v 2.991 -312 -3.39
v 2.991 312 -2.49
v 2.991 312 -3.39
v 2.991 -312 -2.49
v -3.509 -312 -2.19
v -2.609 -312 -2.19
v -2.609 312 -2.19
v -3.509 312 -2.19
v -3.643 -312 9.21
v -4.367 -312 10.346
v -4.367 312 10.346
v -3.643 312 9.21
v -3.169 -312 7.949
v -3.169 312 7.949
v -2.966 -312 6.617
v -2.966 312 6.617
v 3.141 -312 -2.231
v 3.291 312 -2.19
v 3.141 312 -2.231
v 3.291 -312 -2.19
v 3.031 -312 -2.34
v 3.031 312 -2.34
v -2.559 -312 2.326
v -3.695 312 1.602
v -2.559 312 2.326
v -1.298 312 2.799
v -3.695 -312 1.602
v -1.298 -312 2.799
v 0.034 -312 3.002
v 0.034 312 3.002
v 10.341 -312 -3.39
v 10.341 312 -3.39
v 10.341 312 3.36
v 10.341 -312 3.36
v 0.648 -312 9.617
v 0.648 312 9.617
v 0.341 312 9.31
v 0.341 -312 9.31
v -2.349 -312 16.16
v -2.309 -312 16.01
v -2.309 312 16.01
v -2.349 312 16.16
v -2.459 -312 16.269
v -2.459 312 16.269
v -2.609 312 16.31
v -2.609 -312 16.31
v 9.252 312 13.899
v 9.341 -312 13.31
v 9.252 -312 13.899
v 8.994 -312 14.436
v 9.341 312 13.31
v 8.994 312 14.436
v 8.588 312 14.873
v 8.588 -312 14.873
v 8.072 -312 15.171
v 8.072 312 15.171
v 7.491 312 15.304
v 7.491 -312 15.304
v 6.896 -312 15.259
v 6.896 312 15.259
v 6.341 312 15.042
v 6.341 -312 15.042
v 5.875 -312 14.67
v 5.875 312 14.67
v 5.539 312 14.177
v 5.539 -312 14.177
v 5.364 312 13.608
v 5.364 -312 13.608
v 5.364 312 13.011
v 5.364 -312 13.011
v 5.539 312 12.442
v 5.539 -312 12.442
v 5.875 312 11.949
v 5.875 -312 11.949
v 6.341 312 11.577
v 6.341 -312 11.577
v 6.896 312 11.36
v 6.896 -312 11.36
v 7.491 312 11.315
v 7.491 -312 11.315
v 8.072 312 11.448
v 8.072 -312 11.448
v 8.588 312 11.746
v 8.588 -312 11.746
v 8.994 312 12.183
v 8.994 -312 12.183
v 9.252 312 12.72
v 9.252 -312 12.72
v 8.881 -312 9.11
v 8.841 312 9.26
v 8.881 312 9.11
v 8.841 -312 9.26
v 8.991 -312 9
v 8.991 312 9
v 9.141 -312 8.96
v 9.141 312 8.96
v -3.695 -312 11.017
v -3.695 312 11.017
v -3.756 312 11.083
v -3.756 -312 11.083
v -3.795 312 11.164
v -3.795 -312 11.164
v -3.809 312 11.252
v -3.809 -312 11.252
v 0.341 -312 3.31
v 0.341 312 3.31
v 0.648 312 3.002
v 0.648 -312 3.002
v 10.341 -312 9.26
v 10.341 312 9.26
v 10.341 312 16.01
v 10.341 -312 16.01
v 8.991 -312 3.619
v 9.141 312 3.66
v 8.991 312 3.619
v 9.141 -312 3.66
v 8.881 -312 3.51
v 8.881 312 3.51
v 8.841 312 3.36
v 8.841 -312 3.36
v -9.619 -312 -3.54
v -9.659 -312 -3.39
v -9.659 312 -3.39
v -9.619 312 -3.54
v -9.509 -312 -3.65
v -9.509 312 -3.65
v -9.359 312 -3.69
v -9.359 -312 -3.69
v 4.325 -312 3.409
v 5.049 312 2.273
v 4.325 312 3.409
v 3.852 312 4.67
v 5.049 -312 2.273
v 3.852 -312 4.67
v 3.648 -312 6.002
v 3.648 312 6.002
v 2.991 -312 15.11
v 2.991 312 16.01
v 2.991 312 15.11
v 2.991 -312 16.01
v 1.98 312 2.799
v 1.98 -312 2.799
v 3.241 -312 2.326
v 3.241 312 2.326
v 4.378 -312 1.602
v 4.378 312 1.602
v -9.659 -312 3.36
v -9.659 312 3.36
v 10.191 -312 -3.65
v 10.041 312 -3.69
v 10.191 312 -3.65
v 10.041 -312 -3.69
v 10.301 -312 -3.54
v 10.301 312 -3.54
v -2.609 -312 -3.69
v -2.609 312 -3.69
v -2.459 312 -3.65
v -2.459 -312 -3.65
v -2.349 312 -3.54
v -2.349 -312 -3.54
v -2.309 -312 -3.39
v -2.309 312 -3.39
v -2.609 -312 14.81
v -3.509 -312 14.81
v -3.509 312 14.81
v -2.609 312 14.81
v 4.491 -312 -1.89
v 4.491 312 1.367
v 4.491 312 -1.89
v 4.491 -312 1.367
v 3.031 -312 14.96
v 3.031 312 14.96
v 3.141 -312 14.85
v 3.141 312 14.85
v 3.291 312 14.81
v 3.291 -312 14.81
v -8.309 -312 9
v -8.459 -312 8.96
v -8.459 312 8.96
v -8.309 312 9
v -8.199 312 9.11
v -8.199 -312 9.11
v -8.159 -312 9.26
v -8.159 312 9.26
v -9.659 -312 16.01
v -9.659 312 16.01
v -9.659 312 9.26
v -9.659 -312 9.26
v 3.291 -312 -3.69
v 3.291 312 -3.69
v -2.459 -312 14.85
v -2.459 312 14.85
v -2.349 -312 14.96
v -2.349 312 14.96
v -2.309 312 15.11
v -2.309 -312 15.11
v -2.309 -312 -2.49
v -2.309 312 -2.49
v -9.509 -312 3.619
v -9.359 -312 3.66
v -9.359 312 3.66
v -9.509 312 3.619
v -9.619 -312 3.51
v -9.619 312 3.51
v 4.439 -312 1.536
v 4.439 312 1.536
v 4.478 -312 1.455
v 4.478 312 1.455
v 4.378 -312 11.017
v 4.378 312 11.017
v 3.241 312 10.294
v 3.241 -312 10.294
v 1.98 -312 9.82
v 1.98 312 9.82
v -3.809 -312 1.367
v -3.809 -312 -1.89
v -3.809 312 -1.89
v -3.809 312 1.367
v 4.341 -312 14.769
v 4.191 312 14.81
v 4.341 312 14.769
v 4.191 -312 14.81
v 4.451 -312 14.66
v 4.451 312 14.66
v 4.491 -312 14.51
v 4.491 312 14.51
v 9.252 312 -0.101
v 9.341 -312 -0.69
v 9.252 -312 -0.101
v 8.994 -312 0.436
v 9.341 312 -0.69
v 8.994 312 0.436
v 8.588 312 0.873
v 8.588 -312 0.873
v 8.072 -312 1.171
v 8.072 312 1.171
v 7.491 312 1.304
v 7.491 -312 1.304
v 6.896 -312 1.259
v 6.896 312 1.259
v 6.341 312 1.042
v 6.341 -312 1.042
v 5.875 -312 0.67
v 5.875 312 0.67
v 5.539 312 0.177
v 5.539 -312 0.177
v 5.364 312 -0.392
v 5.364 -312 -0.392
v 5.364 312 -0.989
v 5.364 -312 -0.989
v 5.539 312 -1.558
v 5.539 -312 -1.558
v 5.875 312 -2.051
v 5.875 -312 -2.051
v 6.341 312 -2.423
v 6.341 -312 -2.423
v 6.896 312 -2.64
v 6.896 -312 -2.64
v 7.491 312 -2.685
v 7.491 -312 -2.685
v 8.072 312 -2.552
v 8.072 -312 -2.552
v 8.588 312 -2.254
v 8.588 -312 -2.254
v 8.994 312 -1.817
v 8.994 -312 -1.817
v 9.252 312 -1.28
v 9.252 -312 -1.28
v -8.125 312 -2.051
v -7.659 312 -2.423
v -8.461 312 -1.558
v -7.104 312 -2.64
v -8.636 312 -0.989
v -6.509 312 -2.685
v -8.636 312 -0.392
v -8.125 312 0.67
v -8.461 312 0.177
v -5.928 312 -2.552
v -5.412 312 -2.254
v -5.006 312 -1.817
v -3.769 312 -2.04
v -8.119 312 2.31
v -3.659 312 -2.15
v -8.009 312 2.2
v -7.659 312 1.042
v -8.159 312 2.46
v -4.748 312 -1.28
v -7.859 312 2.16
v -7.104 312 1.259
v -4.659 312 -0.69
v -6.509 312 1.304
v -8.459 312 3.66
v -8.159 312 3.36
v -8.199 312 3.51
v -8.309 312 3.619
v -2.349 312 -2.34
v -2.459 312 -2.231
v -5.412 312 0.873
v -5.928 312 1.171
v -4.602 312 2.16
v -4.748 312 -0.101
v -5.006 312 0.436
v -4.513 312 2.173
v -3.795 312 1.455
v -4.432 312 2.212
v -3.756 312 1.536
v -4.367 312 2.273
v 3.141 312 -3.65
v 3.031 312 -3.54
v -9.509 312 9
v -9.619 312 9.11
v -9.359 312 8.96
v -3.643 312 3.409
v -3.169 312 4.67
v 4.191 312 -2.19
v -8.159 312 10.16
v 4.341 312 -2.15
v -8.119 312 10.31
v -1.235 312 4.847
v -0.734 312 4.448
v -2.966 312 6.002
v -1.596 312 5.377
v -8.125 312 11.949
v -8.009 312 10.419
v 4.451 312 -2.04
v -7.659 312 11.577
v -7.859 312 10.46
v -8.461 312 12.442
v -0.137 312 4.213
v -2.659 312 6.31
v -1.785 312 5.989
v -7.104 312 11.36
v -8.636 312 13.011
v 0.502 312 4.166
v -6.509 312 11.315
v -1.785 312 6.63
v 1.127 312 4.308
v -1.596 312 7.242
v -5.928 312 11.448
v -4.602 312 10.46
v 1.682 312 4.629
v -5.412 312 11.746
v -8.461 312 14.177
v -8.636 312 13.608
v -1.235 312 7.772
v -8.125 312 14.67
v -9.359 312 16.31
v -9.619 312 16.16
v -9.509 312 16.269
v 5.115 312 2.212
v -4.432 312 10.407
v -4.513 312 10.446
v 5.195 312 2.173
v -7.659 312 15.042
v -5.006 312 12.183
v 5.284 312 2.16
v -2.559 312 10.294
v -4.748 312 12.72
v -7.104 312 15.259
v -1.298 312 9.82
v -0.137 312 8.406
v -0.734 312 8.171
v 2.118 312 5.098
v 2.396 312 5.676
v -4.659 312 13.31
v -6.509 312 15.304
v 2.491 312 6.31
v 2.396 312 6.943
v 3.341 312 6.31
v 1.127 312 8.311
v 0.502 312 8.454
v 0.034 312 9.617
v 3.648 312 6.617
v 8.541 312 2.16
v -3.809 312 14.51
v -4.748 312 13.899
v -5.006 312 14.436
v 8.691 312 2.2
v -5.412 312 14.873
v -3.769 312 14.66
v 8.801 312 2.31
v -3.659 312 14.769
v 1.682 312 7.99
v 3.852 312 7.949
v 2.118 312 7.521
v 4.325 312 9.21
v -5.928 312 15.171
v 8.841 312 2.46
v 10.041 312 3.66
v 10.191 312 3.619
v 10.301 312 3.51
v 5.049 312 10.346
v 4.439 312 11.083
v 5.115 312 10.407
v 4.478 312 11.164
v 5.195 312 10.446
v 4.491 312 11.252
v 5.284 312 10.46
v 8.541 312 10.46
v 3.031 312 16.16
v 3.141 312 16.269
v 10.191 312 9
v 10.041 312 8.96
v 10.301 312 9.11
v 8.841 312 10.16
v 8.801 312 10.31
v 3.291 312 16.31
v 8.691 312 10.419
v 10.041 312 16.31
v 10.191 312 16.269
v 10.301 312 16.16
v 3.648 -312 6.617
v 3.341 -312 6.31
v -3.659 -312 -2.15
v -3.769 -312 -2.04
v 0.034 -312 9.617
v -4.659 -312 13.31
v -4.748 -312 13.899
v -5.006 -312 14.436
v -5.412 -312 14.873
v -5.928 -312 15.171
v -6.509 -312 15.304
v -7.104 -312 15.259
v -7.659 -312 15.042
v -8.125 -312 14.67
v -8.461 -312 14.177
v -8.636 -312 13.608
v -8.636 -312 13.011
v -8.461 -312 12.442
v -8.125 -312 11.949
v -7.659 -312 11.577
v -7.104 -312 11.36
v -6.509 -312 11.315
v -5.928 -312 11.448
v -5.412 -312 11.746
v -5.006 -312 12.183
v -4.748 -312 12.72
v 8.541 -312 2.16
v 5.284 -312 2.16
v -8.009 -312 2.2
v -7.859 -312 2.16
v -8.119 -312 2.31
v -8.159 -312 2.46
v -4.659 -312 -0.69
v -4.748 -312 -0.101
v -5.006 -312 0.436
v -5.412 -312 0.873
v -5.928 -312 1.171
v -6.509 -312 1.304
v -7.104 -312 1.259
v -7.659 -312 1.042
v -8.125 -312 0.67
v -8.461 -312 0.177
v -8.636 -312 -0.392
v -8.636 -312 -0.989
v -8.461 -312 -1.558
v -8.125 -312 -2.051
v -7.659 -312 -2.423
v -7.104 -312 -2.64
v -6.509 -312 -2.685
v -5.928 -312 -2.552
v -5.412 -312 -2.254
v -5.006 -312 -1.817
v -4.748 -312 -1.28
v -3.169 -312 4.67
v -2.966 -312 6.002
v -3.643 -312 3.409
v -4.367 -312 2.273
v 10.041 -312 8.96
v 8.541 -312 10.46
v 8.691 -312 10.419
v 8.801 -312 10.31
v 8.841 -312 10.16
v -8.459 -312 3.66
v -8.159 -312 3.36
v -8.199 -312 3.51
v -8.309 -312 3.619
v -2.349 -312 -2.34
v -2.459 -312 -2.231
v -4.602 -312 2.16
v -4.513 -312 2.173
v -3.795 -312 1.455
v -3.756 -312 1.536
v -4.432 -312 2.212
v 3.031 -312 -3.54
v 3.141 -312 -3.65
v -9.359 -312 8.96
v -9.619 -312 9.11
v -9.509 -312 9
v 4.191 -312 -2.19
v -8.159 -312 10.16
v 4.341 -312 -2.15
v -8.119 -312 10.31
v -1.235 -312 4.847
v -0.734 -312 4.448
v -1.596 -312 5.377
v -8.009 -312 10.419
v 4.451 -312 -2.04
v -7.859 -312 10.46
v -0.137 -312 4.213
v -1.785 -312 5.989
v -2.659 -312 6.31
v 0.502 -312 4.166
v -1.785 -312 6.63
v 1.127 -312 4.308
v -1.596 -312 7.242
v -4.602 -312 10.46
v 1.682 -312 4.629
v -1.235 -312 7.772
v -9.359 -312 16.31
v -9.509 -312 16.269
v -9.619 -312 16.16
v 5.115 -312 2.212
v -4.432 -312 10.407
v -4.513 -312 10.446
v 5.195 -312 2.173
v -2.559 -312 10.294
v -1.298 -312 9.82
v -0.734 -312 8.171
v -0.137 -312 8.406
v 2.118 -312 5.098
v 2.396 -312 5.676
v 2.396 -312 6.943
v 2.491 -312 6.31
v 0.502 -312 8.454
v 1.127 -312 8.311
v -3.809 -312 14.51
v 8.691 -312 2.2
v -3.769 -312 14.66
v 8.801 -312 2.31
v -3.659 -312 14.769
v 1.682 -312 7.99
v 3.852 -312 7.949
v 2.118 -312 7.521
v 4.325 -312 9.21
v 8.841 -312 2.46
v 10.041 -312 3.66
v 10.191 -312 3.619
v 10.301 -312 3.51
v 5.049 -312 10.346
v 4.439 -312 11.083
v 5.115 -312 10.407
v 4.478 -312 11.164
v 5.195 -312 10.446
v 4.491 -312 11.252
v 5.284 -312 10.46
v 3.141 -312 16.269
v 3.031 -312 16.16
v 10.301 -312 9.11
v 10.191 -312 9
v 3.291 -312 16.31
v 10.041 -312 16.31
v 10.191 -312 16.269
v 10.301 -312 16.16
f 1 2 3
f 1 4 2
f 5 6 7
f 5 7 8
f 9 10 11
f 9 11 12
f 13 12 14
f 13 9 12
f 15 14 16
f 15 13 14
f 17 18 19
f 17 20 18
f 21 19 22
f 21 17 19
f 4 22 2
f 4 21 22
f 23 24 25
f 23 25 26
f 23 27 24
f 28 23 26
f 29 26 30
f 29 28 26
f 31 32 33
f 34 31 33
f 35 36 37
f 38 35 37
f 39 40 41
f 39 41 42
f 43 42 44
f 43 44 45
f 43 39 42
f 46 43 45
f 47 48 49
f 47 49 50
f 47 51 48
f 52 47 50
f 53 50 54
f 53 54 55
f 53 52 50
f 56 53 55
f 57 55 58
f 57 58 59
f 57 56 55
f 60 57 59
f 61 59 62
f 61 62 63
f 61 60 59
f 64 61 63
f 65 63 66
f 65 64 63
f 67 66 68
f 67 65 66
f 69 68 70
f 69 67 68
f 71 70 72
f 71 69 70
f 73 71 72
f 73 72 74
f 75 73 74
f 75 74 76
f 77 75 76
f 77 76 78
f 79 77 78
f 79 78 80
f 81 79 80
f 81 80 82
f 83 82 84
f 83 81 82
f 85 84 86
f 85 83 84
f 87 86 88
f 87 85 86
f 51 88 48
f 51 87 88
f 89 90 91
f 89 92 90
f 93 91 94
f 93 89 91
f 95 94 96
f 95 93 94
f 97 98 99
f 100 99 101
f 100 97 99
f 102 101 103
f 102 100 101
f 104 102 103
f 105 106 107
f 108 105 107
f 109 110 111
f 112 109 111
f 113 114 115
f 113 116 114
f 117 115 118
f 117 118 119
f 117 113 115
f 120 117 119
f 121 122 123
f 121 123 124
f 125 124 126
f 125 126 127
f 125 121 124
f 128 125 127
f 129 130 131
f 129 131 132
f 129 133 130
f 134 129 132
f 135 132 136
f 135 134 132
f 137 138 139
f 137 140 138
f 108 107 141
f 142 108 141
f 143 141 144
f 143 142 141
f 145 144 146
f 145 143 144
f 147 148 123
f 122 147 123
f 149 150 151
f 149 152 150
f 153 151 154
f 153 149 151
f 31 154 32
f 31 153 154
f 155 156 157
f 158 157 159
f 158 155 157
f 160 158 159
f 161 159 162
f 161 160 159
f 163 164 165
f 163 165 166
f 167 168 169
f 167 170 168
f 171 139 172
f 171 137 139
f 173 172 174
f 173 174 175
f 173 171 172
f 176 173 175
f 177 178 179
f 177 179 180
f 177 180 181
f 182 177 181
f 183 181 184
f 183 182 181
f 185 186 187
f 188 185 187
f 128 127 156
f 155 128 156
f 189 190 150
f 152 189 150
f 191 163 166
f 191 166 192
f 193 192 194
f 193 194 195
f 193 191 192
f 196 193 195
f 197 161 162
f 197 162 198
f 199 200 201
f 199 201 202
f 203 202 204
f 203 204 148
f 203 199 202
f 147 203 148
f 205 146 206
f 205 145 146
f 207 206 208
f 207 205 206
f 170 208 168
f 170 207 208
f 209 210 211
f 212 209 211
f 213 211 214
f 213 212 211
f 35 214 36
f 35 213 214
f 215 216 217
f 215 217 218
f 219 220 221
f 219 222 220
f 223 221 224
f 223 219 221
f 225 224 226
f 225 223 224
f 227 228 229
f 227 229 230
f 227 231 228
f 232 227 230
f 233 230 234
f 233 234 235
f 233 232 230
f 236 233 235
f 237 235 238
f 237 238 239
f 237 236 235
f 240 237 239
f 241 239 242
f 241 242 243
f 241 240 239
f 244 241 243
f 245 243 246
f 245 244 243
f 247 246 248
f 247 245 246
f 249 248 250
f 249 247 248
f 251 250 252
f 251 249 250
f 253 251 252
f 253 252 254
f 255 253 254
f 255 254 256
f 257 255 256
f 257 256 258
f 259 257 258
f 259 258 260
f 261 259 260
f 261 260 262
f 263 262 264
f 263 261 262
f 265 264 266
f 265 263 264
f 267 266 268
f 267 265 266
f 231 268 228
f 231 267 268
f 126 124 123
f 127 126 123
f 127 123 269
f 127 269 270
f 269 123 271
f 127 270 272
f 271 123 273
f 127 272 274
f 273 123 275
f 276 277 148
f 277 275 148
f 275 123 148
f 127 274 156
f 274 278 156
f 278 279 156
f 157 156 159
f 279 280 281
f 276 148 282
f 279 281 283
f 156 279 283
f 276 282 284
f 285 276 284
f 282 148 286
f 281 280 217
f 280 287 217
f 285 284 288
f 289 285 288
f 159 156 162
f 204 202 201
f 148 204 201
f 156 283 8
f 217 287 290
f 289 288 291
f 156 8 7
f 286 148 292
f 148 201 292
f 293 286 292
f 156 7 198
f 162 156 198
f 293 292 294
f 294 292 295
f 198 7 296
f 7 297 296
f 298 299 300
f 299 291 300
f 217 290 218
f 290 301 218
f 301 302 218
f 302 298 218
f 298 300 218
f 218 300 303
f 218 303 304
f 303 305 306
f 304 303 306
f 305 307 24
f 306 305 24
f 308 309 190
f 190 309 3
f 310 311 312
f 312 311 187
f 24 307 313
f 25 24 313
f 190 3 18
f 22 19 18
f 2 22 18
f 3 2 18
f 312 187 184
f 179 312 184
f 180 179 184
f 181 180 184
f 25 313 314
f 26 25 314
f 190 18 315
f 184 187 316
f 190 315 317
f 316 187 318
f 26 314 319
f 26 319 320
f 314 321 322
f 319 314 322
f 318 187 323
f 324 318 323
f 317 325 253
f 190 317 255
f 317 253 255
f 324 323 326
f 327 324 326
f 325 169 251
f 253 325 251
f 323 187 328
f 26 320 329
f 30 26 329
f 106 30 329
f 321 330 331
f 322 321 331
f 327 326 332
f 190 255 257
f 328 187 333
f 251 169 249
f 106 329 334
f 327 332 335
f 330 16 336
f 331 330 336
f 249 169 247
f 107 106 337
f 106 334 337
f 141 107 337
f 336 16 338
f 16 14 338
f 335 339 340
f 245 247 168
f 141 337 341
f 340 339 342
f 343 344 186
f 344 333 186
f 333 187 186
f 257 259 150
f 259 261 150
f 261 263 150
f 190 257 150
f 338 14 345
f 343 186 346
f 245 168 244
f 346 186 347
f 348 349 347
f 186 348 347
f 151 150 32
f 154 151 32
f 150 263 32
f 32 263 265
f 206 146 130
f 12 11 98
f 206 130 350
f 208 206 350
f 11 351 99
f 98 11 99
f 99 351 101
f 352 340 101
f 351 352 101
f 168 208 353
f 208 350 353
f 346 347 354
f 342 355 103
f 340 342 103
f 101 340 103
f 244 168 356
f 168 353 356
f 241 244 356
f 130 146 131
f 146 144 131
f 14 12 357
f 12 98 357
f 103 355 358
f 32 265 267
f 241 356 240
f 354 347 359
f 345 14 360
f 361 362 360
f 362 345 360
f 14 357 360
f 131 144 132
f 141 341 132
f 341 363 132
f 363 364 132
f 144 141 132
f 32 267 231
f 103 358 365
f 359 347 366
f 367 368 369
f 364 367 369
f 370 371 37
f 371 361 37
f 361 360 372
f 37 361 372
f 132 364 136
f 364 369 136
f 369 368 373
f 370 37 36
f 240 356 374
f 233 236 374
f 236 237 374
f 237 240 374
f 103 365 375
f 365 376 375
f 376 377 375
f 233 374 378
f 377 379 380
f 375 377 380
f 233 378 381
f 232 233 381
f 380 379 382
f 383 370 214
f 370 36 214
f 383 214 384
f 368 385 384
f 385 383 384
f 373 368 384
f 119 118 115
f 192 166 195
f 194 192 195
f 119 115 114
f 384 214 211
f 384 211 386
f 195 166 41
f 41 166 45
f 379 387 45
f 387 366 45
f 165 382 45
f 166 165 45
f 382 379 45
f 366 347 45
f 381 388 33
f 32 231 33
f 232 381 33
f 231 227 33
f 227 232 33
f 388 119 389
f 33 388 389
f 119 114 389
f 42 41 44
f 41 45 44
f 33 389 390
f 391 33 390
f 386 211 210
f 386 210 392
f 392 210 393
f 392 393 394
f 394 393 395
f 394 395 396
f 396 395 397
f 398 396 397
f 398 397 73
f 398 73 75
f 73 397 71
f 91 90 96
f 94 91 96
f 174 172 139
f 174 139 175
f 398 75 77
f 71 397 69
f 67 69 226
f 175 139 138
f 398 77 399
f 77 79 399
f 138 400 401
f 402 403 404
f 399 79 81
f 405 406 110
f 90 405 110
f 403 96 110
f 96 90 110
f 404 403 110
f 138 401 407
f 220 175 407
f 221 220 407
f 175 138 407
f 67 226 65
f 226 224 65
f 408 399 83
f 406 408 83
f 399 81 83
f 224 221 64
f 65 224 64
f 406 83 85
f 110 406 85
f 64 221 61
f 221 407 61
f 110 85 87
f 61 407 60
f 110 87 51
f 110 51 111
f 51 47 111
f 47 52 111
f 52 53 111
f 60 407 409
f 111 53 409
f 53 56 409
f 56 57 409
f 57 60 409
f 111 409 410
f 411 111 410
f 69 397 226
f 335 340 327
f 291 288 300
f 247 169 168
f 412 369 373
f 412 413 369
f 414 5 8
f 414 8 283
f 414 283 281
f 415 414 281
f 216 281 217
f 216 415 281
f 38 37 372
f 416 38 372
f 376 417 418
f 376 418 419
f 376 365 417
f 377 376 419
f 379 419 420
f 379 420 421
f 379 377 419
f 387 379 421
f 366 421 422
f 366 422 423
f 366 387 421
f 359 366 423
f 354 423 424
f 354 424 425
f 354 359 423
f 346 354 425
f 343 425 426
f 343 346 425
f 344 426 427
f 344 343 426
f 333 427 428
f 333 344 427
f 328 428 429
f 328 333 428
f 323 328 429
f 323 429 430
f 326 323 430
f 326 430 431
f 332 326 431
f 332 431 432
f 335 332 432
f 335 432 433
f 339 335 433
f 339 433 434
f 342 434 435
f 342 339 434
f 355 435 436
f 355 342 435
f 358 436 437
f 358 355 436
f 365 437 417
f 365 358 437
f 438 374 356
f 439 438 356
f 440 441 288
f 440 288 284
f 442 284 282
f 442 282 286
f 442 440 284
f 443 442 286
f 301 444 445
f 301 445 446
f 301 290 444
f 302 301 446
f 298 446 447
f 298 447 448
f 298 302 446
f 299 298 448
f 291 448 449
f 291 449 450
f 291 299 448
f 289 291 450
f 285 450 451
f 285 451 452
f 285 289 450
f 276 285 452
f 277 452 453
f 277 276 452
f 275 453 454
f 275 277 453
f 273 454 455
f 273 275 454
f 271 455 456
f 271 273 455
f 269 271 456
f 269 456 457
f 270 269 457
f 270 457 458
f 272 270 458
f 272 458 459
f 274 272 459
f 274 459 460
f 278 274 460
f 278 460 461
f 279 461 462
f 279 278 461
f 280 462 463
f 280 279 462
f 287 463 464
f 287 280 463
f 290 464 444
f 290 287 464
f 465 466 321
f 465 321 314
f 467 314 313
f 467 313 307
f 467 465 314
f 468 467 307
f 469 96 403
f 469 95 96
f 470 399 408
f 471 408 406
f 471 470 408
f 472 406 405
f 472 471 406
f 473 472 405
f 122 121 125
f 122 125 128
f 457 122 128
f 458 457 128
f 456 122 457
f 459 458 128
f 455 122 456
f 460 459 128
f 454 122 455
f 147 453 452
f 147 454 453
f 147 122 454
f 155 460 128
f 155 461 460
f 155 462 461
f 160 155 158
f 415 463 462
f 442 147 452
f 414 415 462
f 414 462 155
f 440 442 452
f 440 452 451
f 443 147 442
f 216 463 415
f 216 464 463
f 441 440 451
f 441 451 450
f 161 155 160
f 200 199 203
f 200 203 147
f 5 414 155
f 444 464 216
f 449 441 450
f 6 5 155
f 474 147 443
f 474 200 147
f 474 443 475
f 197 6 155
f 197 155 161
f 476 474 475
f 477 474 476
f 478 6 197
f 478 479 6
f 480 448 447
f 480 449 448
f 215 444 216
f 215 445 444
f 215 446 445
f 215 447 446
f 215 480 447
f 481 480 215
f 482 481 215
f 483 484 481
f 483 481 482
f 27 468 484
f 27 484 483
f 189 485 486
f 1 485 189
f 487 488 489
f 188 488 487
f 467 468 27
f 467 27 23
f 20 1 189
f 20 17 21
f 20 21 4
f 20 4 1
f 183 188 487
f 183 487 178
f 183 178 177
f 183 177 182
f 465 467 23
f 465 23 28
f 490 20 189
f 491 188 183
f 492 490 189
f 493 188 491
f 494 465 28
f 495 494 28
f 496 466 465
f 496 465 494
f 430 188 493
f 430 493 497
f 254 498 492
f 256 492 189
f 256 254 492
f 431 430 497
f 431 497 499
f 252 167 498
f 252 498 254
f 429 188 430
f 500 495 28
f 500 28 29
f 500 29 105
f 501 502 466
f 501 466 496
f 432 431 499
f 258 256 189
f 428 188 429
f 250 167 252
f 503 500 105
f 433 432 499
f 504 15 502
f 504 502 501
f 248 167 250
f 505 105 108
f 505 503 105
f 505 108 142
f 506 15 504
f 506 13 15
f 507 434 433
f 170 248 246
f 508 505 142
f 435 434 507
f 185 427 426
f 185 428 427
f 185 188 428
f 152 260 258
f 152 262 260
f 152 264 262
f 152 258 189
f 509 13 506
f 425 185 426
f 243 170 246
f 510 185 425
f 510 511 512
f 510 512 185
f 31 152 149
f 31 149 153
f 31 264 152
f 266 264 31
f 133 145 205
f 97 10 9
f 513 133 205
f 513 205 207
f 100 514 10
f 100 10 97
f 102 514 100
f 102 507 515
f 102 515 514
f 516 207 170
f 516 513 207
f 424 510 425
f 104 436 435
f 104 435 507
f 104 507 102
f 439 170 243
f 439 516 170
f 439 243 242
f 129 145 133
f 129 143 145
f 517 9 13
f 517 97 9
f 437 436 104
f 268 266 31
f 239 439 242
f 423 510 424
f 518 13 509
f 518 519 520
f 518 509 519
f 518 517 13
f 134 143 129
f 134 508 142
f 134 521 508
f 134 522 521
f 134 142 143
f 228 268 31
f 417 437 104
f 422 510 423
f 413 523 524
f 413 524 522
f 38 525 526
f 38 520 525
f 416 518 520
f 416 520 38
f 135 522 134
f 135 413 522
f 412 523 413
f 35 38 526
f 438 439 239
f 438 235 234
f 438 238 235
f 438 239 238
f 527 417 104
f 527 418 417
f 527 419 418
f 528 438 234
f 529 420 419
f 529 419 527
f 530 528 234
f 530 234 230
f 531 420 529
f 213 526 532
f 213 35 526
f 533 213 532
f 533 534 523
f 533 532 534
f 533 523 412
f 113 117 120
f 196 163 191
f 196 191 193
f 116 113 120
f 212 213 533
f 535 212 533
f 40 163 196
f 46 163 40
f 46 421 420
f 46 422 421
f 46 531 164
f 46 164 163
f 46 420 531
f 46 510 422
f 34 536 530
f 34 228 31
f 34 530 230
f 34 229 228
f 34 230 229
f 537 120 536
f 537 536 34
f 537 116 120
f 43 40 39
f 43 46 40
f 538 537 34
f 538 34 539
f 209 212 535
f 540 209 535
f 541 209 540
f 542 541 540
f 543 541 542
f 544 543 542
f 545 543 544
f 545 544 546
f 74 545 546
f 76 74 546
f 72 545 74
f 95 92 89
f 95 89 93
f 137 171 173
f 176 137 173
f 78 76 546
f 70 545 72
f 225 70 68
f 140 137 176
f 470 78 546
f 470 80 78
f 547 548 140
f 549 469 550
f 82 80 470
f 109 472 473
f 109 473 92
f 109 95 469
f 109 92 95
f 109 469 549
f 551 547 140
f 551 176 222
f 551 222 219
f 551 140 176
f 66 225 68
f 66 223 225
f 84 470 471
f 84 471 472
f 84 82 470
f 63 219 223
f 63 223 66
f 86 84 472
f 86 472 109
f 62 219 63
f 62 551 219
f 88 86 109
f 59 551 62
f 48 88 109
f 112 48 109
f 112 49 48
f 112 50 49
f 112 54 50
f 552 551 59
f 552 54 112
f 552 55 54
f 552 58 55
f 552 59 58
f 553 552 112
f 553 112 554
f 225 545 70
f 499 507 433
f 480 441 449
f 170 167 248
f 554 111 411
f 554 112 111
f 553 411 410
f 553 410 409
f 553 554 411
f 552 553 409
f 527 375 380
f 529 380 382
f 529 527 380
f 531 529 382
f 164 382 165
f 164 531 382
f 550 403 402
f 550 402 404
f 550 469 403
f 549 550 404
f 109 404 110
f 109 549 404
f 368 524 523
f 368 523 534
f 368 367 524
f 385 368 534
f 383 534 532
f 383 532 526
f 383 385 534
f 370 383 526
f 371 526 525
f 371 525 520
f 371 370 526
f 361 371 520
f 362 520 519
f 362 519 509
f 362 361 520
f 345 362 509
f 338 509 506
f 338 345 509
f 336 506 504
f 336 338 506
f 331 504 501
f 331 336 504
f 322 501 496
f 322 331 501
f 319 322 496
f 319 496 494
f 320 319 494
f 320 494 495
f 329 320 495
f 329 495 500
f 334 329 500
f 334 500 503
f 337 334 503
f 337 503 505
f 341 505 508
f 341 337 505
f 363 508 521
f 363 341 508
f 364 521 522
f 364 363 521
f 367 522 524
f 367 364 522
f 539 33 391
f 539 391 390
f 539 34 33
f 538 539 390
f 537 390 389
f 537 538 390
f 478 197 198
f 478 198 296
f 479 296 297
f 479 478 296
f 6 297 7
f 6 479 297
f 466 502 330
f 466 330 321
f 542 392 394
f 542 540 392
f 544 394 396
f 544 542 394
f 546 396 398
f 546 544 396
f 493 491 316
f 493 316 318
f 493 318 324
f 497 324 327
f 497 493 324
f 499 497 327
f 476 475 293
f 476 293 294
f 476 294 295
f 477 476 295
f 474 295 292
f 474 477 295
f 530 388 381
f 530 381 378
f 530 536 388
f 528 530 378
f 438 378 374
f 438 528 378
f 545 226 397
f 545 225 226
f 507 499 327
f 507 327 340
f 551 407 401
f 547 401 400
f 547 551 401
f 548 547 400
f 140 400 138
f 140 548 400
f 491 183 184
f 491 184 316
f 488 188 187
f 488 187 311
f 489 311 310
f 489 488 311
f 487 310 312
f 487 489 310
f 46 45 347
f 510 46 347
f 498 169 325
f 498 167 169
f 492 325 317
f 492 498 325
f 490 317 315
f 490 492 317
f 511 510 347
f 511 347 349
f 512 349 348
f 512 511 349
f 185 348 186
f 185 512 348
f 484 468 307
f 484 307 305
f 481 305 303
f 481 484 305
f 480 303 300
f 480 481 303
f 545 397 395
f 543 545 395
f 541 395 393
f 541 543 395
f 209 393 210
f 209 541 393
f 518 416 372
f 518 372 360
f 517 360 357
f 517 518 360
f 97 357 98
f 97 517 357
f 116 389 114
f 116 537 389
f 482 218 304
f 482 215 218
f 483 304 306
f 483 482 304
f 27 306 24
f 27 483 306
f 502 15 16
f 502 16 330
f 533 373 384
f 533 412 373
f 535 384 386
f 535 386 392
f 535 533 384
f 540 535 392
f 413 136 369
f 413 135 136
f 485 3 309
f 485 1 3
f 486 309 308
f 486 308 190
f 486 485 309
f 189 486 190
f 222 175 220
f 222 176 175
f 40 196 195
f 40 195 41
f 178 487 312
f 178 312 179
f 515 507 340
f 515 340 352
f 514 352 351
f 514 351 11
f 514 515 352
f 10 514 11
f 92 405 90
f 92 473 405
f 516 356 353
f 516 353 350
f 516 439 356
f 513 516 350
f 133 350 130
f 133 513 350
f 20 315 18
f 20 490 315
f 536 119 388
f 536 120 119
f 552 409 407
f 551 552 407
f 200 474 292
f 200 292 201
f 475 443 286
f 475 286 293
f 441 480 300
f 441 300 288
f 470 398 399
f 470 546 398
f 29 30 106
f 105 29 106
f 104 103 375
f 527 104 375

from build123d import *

# Parameters (mm, degrees)
F0_R     = 2
F0_R_2   = 2.15
F1_DEPTH = 312


# Not quite as in the source:
# - ends of sketch curves that miss each other by under 0.0002 mm in the source are joined


with BuildPart() as f1:
    # F0 (on Front) → F1 (new body, symmetric)
    with BuildSketch(Plane.XZ):
        with BuildLine():
            Line((4.49119, 14.509531), (4.49119, 11.252281))
            ThreePointArc((4.49119, 11.252281), (4.4613472004, 11.1218391084), (4.377756086, 11.0173488916))
            ThreePointArc((4.377756086, 11.0173488916), (2.6232116259, 10.0239112371), (0.6484679813, 9.6168093955))
            Line((0.6484679813, 9.6168093955), (0.34119, 9.309531))
            Line((0.34119, 9.309531), (0.033913, 9.616809))
            ThreePointArc((0.033913, 9.616809), (-1.9408311583, 10.0239110615), (-3.695375823, 11.0173492229))
            ThreePointArc((-3.695375823, 11.0173492229), (-3.7789672004, 11.1218391084), (-3.80881, 11.252281))
            Line((-3.80881, 11.252281), (-3.80881, 14.509531))
            ThreePointArc((-3.80881, 14.509531), (-3.7209420344, 14.7216630344), (-3.50881, 14.809531))
            Line((-3.50881, 14.809531), (-2.60881, 14.809531))
            ThreePointArc((-2.60881, 14.809531), (-2.3966779656, 14.8973989656), (-2.30881, 15.109531))
            Line((-2.30881, 15.109531), (-2.30881, 16.009531))
            ThreePointArc((-2.30881, 16.009531), (-2.3966779656, 16.2216630344), (-2.60881, 16.309531))
            Line((-2.60881, 16.309531), (-9.35881, 16.309531))
            ThreePointArc((-9.35881, 16.309531), (-9.5709420344, 16.2216630344), (-9.65881, 16.009531))
            Line((-9.65881, 16.009531), (-9.65881, 9.259531))
            ThreePointArc((-9.65881, 9.259531), (-9.5709420344, 9.0473989656), (-9.35881, 8.959531))
            Line((-9.35881, 8.959531), (-8.45881, 8.959531))
            ThreePointArc((-8.45881, 8.959531), (-8.2466779656, 9.0473989656), (-8.15881, 9.259531))
            Line((-8.15881, 9.259531), (-8.15881, 10.159531))
            ThreePointArc((-8.15881, 10.159531), (-8.0709420344, 10.3716630344), (-7.85881, 10.459531))
            Line((-7.85881, 10.459531), (-4.601559, 10.459531))
            ThreePointArc((-4.601559, 10.459531), (-4.471117461, 10.4296883706), (-4.3666273786, 10.3460976993))
            ThreePointArc((-4.3666273786, 10.3460976993), (-3.3731893747, 8.5915529924), (-2.9660873955, 6.6168089813))
            Line((-2.9660873955, 6.6168089813), (-2.65881, 6.309531))
            Line((-2.65881, 6.309531), (-2.966087, 6.002254))
            ThreePointArc((-2.966087, 6.002254), (-3.3731890615, 4.0275098417), (-4.3666272229, 2.272965177))
            ThreePointArc((-4.3666272229, 2.272965177), (-4.4711171084, 2.1893737996), (-4.601559, 2.159531))
            Line((-4.601559, 2.159531), (-7.85881, 2.159531))
            ThreePointArc((-7.85881, 2.159531), (-8.0709420344, 2.2473989656), (-8.15881, 2.459531))
            Line((-8.15881, 2.459531), (-8.15881, 3.359531))
            ThreePointArc((-8.15881, 3.359531), (-8.2466779656, 3.5716630344), (-8.45881, 3.659531))
            Line((-8.45881, 3.659531), (-9.35881, 3.659531))
            ThreePointArc((-9.35881, 3.659531), (-9.5709420344, 3.5716630344), (-9.65881, 3.359531))
            Line((-9.65881, 3.359531), (-9.65881, -3.390469))
            ThreePointArc((-9.65881, -3.390469), (-9.5709420344, -3.6026010344), (-9.35881, -3.690469))
            Line((-9.35881, -3.690469), (-2.60881, -3.690469))
            ThreePointArc((-2.60881, -3.690469), (-2.3966779656, -3.6026010344), (-2.30881, -3.390469))
            Line((-2.30881, -3.390469), (-2.30881, -2.490469))
            ThreePointArc((-2.30881, -2.490469), (-2.3966779656, -2.2783369656), (-2.60881, -2.190469))
            Line((-2.60881, -2.190469), (-3.50881, -2.190469))
            ThreePointArc((-3.50881, -2.190469), (-3.7209420344, -2.1026010344), (-3.80881, -1.890469))
            Line((-3.80881, -1.890469), (-3.80881, 1.366782))
            ThreePointArc((-3.80881, 1.366782), (-3.7789672004, 1.4972238916), (-3.695376086, 1.6017141084))
            ThreePointArc((-3.695376086, 1.6017141084), (-1.9408311583, 2.5951519385), (0.0339130165, 3.0022536517))
            Line((0.0339130165, 3.0022536517), (0.34119, 3.309531))
            Line((0.34119, 3.309531), (0.648468, 3.002254))
            ThreePointArc((0.648468, 3.002254), (2.6232116259, 2.5951517629), (4.377755823, 1.6017137771))
            ThreePointArc((4.377755823, 1.6017137771), (4.4613472004, 1.4972238916), (4.49119, 1.366782))
            Line((4.49119, 1.366782), (4.49119, -1.890469))
            ThreePointArc((4.49119, -1.890469), (4.4033220344, -2.1026010344), (4.19119, -2.190469))
            Line((4.19119, -2.190469), (3.29119, -2.190469))
            ThreePointArc((3.29119, -2.190469), (3.0790579656, -2.2783369656), (2.99119, -2.490469))
            Line((2.99119, -2.490469), (2.99119, -3.390469))
            ThreePointArc((2.99119, -3.390469), (3.0790579656, -3.6026010344), (3.29119, -3.690469))
            Line((3.29119, -3.690469), (10.04119, -3.690469))
            ThreePointArc((10.04119, -3.690469), (10.2533220344, -3.6026010344), (10.34119, -3.390469))
            Line((10.34119, -3.390469), (10.34119, 3.359531))
            ThreePointArc((10.34119, 3.359531), (10.2533220344, 3.5716630344), (10.04119, 3.659531))
            Line((10.04119, 3.659531), (9.14119, 3.659531))
            ThreePointArc((9.14119, 3.659531), (8.9290579656, 3.5716630344), (8.84119, 3.359531))
            Line((8.84119, 3.359531), (8.84119, 2.459531))
            ThreePointArc((8.84119, 2.459531), (8.7533220344, 2.2473989656), (8.54119, 2.159531))
            Line((8.54119, 2.159531), (5.28394, 2.159531))
            ThreePointArc((5.28394, 2.159531), (5.1534981084, 2.1893737996), (5.0490078916, 2.272964914))
            ThreePointArc((5.0490078916, 2.272964914), (4.0555700615, 4.0275098417), (3.6484683483, 6.0022540165))
            Line((3.6484683483, 6.0022540165), (3.34119, 6.309531))
            Line((3.34119, 6.309531), (3.648468, 6.616809))
            ThreePointArc((3.648468, 6.616809), (4.0555703747, 8.5915529924), (5.0490087099, 10.3460974363))
            ThreePointArc((5.0490087099, 10.3460974363), (5.153498461, 10.4296883706), (5.28394, 10.459531))
            Line((5.28394, 10.459531), (8.54119, 10.459531))
            ThreePointArc((8.54119, 10.459531), (8.7533220344, 10.3716630344), (8.84119, 10.159531))
            Line((8.84119, 10.159531), (8.84119, 9.259531))
            ThreePointArc((8.84119, 9.259531), (8.9290579656, 9.0473989656), (9.14119, 8.959531))
            Line((9.14119, 8.959531), (10.04119, 8.959531))
            ThreePointArc((10.04119, 8.959531), (10.2533220344, 9.0473989656), (10.34119, 9.259531))
            Line((10.34119, 9.259531), (10.34119, 16.009531))
            ThreePointArc((10.34119, 16.009531), (10.2533220344, 16.2216630344), (10.04119, 16.309531))
            Line((10.04119, 16.309531), (3.29119, 16.309531))
            ThreePointArc((3.29119, 16.309531), (3.0790579656, 16.2216630344), (2.99119, 16.009531))
            Line((2.99119, 16.009531), (2.99119, 15.109531))
            ThreePointArc((2.99119, 15.109531), (3.0790579656, 14.8973989656), (3.29119, 14.809531))
            Line((3.29119, 14.809531), (4.19119, 14.809531))
            ThreePointArc((4.19119, 14.809531), (4.4033220344, 14.7216630344), (4.49119, 14.509531))
        make_face()
        with Locations((-6.65881, -0.690469)):
            Circle(F0_R, mode=Mode.SUBTRACT)
        with Locations((7.34119, -0.690469)):
            Circle(F0_R, mode=Mode.SUBTRACT)
        with Locations((-6.65881, 13.309531)):
            Circle(F0_R, mode=Mode.SUBTRACT)
        with Locations((0.34119, 6.309531)):
            Circle(F0_R_2, mode=Mode.SUBTRACT)
        with Locations((7.34119, 13.309531)):
            Circle(F0_R, mode=Mode.SUBTRACT)
    extrude(amount=F1_DEPTH, both=True)


solid = f1.part
